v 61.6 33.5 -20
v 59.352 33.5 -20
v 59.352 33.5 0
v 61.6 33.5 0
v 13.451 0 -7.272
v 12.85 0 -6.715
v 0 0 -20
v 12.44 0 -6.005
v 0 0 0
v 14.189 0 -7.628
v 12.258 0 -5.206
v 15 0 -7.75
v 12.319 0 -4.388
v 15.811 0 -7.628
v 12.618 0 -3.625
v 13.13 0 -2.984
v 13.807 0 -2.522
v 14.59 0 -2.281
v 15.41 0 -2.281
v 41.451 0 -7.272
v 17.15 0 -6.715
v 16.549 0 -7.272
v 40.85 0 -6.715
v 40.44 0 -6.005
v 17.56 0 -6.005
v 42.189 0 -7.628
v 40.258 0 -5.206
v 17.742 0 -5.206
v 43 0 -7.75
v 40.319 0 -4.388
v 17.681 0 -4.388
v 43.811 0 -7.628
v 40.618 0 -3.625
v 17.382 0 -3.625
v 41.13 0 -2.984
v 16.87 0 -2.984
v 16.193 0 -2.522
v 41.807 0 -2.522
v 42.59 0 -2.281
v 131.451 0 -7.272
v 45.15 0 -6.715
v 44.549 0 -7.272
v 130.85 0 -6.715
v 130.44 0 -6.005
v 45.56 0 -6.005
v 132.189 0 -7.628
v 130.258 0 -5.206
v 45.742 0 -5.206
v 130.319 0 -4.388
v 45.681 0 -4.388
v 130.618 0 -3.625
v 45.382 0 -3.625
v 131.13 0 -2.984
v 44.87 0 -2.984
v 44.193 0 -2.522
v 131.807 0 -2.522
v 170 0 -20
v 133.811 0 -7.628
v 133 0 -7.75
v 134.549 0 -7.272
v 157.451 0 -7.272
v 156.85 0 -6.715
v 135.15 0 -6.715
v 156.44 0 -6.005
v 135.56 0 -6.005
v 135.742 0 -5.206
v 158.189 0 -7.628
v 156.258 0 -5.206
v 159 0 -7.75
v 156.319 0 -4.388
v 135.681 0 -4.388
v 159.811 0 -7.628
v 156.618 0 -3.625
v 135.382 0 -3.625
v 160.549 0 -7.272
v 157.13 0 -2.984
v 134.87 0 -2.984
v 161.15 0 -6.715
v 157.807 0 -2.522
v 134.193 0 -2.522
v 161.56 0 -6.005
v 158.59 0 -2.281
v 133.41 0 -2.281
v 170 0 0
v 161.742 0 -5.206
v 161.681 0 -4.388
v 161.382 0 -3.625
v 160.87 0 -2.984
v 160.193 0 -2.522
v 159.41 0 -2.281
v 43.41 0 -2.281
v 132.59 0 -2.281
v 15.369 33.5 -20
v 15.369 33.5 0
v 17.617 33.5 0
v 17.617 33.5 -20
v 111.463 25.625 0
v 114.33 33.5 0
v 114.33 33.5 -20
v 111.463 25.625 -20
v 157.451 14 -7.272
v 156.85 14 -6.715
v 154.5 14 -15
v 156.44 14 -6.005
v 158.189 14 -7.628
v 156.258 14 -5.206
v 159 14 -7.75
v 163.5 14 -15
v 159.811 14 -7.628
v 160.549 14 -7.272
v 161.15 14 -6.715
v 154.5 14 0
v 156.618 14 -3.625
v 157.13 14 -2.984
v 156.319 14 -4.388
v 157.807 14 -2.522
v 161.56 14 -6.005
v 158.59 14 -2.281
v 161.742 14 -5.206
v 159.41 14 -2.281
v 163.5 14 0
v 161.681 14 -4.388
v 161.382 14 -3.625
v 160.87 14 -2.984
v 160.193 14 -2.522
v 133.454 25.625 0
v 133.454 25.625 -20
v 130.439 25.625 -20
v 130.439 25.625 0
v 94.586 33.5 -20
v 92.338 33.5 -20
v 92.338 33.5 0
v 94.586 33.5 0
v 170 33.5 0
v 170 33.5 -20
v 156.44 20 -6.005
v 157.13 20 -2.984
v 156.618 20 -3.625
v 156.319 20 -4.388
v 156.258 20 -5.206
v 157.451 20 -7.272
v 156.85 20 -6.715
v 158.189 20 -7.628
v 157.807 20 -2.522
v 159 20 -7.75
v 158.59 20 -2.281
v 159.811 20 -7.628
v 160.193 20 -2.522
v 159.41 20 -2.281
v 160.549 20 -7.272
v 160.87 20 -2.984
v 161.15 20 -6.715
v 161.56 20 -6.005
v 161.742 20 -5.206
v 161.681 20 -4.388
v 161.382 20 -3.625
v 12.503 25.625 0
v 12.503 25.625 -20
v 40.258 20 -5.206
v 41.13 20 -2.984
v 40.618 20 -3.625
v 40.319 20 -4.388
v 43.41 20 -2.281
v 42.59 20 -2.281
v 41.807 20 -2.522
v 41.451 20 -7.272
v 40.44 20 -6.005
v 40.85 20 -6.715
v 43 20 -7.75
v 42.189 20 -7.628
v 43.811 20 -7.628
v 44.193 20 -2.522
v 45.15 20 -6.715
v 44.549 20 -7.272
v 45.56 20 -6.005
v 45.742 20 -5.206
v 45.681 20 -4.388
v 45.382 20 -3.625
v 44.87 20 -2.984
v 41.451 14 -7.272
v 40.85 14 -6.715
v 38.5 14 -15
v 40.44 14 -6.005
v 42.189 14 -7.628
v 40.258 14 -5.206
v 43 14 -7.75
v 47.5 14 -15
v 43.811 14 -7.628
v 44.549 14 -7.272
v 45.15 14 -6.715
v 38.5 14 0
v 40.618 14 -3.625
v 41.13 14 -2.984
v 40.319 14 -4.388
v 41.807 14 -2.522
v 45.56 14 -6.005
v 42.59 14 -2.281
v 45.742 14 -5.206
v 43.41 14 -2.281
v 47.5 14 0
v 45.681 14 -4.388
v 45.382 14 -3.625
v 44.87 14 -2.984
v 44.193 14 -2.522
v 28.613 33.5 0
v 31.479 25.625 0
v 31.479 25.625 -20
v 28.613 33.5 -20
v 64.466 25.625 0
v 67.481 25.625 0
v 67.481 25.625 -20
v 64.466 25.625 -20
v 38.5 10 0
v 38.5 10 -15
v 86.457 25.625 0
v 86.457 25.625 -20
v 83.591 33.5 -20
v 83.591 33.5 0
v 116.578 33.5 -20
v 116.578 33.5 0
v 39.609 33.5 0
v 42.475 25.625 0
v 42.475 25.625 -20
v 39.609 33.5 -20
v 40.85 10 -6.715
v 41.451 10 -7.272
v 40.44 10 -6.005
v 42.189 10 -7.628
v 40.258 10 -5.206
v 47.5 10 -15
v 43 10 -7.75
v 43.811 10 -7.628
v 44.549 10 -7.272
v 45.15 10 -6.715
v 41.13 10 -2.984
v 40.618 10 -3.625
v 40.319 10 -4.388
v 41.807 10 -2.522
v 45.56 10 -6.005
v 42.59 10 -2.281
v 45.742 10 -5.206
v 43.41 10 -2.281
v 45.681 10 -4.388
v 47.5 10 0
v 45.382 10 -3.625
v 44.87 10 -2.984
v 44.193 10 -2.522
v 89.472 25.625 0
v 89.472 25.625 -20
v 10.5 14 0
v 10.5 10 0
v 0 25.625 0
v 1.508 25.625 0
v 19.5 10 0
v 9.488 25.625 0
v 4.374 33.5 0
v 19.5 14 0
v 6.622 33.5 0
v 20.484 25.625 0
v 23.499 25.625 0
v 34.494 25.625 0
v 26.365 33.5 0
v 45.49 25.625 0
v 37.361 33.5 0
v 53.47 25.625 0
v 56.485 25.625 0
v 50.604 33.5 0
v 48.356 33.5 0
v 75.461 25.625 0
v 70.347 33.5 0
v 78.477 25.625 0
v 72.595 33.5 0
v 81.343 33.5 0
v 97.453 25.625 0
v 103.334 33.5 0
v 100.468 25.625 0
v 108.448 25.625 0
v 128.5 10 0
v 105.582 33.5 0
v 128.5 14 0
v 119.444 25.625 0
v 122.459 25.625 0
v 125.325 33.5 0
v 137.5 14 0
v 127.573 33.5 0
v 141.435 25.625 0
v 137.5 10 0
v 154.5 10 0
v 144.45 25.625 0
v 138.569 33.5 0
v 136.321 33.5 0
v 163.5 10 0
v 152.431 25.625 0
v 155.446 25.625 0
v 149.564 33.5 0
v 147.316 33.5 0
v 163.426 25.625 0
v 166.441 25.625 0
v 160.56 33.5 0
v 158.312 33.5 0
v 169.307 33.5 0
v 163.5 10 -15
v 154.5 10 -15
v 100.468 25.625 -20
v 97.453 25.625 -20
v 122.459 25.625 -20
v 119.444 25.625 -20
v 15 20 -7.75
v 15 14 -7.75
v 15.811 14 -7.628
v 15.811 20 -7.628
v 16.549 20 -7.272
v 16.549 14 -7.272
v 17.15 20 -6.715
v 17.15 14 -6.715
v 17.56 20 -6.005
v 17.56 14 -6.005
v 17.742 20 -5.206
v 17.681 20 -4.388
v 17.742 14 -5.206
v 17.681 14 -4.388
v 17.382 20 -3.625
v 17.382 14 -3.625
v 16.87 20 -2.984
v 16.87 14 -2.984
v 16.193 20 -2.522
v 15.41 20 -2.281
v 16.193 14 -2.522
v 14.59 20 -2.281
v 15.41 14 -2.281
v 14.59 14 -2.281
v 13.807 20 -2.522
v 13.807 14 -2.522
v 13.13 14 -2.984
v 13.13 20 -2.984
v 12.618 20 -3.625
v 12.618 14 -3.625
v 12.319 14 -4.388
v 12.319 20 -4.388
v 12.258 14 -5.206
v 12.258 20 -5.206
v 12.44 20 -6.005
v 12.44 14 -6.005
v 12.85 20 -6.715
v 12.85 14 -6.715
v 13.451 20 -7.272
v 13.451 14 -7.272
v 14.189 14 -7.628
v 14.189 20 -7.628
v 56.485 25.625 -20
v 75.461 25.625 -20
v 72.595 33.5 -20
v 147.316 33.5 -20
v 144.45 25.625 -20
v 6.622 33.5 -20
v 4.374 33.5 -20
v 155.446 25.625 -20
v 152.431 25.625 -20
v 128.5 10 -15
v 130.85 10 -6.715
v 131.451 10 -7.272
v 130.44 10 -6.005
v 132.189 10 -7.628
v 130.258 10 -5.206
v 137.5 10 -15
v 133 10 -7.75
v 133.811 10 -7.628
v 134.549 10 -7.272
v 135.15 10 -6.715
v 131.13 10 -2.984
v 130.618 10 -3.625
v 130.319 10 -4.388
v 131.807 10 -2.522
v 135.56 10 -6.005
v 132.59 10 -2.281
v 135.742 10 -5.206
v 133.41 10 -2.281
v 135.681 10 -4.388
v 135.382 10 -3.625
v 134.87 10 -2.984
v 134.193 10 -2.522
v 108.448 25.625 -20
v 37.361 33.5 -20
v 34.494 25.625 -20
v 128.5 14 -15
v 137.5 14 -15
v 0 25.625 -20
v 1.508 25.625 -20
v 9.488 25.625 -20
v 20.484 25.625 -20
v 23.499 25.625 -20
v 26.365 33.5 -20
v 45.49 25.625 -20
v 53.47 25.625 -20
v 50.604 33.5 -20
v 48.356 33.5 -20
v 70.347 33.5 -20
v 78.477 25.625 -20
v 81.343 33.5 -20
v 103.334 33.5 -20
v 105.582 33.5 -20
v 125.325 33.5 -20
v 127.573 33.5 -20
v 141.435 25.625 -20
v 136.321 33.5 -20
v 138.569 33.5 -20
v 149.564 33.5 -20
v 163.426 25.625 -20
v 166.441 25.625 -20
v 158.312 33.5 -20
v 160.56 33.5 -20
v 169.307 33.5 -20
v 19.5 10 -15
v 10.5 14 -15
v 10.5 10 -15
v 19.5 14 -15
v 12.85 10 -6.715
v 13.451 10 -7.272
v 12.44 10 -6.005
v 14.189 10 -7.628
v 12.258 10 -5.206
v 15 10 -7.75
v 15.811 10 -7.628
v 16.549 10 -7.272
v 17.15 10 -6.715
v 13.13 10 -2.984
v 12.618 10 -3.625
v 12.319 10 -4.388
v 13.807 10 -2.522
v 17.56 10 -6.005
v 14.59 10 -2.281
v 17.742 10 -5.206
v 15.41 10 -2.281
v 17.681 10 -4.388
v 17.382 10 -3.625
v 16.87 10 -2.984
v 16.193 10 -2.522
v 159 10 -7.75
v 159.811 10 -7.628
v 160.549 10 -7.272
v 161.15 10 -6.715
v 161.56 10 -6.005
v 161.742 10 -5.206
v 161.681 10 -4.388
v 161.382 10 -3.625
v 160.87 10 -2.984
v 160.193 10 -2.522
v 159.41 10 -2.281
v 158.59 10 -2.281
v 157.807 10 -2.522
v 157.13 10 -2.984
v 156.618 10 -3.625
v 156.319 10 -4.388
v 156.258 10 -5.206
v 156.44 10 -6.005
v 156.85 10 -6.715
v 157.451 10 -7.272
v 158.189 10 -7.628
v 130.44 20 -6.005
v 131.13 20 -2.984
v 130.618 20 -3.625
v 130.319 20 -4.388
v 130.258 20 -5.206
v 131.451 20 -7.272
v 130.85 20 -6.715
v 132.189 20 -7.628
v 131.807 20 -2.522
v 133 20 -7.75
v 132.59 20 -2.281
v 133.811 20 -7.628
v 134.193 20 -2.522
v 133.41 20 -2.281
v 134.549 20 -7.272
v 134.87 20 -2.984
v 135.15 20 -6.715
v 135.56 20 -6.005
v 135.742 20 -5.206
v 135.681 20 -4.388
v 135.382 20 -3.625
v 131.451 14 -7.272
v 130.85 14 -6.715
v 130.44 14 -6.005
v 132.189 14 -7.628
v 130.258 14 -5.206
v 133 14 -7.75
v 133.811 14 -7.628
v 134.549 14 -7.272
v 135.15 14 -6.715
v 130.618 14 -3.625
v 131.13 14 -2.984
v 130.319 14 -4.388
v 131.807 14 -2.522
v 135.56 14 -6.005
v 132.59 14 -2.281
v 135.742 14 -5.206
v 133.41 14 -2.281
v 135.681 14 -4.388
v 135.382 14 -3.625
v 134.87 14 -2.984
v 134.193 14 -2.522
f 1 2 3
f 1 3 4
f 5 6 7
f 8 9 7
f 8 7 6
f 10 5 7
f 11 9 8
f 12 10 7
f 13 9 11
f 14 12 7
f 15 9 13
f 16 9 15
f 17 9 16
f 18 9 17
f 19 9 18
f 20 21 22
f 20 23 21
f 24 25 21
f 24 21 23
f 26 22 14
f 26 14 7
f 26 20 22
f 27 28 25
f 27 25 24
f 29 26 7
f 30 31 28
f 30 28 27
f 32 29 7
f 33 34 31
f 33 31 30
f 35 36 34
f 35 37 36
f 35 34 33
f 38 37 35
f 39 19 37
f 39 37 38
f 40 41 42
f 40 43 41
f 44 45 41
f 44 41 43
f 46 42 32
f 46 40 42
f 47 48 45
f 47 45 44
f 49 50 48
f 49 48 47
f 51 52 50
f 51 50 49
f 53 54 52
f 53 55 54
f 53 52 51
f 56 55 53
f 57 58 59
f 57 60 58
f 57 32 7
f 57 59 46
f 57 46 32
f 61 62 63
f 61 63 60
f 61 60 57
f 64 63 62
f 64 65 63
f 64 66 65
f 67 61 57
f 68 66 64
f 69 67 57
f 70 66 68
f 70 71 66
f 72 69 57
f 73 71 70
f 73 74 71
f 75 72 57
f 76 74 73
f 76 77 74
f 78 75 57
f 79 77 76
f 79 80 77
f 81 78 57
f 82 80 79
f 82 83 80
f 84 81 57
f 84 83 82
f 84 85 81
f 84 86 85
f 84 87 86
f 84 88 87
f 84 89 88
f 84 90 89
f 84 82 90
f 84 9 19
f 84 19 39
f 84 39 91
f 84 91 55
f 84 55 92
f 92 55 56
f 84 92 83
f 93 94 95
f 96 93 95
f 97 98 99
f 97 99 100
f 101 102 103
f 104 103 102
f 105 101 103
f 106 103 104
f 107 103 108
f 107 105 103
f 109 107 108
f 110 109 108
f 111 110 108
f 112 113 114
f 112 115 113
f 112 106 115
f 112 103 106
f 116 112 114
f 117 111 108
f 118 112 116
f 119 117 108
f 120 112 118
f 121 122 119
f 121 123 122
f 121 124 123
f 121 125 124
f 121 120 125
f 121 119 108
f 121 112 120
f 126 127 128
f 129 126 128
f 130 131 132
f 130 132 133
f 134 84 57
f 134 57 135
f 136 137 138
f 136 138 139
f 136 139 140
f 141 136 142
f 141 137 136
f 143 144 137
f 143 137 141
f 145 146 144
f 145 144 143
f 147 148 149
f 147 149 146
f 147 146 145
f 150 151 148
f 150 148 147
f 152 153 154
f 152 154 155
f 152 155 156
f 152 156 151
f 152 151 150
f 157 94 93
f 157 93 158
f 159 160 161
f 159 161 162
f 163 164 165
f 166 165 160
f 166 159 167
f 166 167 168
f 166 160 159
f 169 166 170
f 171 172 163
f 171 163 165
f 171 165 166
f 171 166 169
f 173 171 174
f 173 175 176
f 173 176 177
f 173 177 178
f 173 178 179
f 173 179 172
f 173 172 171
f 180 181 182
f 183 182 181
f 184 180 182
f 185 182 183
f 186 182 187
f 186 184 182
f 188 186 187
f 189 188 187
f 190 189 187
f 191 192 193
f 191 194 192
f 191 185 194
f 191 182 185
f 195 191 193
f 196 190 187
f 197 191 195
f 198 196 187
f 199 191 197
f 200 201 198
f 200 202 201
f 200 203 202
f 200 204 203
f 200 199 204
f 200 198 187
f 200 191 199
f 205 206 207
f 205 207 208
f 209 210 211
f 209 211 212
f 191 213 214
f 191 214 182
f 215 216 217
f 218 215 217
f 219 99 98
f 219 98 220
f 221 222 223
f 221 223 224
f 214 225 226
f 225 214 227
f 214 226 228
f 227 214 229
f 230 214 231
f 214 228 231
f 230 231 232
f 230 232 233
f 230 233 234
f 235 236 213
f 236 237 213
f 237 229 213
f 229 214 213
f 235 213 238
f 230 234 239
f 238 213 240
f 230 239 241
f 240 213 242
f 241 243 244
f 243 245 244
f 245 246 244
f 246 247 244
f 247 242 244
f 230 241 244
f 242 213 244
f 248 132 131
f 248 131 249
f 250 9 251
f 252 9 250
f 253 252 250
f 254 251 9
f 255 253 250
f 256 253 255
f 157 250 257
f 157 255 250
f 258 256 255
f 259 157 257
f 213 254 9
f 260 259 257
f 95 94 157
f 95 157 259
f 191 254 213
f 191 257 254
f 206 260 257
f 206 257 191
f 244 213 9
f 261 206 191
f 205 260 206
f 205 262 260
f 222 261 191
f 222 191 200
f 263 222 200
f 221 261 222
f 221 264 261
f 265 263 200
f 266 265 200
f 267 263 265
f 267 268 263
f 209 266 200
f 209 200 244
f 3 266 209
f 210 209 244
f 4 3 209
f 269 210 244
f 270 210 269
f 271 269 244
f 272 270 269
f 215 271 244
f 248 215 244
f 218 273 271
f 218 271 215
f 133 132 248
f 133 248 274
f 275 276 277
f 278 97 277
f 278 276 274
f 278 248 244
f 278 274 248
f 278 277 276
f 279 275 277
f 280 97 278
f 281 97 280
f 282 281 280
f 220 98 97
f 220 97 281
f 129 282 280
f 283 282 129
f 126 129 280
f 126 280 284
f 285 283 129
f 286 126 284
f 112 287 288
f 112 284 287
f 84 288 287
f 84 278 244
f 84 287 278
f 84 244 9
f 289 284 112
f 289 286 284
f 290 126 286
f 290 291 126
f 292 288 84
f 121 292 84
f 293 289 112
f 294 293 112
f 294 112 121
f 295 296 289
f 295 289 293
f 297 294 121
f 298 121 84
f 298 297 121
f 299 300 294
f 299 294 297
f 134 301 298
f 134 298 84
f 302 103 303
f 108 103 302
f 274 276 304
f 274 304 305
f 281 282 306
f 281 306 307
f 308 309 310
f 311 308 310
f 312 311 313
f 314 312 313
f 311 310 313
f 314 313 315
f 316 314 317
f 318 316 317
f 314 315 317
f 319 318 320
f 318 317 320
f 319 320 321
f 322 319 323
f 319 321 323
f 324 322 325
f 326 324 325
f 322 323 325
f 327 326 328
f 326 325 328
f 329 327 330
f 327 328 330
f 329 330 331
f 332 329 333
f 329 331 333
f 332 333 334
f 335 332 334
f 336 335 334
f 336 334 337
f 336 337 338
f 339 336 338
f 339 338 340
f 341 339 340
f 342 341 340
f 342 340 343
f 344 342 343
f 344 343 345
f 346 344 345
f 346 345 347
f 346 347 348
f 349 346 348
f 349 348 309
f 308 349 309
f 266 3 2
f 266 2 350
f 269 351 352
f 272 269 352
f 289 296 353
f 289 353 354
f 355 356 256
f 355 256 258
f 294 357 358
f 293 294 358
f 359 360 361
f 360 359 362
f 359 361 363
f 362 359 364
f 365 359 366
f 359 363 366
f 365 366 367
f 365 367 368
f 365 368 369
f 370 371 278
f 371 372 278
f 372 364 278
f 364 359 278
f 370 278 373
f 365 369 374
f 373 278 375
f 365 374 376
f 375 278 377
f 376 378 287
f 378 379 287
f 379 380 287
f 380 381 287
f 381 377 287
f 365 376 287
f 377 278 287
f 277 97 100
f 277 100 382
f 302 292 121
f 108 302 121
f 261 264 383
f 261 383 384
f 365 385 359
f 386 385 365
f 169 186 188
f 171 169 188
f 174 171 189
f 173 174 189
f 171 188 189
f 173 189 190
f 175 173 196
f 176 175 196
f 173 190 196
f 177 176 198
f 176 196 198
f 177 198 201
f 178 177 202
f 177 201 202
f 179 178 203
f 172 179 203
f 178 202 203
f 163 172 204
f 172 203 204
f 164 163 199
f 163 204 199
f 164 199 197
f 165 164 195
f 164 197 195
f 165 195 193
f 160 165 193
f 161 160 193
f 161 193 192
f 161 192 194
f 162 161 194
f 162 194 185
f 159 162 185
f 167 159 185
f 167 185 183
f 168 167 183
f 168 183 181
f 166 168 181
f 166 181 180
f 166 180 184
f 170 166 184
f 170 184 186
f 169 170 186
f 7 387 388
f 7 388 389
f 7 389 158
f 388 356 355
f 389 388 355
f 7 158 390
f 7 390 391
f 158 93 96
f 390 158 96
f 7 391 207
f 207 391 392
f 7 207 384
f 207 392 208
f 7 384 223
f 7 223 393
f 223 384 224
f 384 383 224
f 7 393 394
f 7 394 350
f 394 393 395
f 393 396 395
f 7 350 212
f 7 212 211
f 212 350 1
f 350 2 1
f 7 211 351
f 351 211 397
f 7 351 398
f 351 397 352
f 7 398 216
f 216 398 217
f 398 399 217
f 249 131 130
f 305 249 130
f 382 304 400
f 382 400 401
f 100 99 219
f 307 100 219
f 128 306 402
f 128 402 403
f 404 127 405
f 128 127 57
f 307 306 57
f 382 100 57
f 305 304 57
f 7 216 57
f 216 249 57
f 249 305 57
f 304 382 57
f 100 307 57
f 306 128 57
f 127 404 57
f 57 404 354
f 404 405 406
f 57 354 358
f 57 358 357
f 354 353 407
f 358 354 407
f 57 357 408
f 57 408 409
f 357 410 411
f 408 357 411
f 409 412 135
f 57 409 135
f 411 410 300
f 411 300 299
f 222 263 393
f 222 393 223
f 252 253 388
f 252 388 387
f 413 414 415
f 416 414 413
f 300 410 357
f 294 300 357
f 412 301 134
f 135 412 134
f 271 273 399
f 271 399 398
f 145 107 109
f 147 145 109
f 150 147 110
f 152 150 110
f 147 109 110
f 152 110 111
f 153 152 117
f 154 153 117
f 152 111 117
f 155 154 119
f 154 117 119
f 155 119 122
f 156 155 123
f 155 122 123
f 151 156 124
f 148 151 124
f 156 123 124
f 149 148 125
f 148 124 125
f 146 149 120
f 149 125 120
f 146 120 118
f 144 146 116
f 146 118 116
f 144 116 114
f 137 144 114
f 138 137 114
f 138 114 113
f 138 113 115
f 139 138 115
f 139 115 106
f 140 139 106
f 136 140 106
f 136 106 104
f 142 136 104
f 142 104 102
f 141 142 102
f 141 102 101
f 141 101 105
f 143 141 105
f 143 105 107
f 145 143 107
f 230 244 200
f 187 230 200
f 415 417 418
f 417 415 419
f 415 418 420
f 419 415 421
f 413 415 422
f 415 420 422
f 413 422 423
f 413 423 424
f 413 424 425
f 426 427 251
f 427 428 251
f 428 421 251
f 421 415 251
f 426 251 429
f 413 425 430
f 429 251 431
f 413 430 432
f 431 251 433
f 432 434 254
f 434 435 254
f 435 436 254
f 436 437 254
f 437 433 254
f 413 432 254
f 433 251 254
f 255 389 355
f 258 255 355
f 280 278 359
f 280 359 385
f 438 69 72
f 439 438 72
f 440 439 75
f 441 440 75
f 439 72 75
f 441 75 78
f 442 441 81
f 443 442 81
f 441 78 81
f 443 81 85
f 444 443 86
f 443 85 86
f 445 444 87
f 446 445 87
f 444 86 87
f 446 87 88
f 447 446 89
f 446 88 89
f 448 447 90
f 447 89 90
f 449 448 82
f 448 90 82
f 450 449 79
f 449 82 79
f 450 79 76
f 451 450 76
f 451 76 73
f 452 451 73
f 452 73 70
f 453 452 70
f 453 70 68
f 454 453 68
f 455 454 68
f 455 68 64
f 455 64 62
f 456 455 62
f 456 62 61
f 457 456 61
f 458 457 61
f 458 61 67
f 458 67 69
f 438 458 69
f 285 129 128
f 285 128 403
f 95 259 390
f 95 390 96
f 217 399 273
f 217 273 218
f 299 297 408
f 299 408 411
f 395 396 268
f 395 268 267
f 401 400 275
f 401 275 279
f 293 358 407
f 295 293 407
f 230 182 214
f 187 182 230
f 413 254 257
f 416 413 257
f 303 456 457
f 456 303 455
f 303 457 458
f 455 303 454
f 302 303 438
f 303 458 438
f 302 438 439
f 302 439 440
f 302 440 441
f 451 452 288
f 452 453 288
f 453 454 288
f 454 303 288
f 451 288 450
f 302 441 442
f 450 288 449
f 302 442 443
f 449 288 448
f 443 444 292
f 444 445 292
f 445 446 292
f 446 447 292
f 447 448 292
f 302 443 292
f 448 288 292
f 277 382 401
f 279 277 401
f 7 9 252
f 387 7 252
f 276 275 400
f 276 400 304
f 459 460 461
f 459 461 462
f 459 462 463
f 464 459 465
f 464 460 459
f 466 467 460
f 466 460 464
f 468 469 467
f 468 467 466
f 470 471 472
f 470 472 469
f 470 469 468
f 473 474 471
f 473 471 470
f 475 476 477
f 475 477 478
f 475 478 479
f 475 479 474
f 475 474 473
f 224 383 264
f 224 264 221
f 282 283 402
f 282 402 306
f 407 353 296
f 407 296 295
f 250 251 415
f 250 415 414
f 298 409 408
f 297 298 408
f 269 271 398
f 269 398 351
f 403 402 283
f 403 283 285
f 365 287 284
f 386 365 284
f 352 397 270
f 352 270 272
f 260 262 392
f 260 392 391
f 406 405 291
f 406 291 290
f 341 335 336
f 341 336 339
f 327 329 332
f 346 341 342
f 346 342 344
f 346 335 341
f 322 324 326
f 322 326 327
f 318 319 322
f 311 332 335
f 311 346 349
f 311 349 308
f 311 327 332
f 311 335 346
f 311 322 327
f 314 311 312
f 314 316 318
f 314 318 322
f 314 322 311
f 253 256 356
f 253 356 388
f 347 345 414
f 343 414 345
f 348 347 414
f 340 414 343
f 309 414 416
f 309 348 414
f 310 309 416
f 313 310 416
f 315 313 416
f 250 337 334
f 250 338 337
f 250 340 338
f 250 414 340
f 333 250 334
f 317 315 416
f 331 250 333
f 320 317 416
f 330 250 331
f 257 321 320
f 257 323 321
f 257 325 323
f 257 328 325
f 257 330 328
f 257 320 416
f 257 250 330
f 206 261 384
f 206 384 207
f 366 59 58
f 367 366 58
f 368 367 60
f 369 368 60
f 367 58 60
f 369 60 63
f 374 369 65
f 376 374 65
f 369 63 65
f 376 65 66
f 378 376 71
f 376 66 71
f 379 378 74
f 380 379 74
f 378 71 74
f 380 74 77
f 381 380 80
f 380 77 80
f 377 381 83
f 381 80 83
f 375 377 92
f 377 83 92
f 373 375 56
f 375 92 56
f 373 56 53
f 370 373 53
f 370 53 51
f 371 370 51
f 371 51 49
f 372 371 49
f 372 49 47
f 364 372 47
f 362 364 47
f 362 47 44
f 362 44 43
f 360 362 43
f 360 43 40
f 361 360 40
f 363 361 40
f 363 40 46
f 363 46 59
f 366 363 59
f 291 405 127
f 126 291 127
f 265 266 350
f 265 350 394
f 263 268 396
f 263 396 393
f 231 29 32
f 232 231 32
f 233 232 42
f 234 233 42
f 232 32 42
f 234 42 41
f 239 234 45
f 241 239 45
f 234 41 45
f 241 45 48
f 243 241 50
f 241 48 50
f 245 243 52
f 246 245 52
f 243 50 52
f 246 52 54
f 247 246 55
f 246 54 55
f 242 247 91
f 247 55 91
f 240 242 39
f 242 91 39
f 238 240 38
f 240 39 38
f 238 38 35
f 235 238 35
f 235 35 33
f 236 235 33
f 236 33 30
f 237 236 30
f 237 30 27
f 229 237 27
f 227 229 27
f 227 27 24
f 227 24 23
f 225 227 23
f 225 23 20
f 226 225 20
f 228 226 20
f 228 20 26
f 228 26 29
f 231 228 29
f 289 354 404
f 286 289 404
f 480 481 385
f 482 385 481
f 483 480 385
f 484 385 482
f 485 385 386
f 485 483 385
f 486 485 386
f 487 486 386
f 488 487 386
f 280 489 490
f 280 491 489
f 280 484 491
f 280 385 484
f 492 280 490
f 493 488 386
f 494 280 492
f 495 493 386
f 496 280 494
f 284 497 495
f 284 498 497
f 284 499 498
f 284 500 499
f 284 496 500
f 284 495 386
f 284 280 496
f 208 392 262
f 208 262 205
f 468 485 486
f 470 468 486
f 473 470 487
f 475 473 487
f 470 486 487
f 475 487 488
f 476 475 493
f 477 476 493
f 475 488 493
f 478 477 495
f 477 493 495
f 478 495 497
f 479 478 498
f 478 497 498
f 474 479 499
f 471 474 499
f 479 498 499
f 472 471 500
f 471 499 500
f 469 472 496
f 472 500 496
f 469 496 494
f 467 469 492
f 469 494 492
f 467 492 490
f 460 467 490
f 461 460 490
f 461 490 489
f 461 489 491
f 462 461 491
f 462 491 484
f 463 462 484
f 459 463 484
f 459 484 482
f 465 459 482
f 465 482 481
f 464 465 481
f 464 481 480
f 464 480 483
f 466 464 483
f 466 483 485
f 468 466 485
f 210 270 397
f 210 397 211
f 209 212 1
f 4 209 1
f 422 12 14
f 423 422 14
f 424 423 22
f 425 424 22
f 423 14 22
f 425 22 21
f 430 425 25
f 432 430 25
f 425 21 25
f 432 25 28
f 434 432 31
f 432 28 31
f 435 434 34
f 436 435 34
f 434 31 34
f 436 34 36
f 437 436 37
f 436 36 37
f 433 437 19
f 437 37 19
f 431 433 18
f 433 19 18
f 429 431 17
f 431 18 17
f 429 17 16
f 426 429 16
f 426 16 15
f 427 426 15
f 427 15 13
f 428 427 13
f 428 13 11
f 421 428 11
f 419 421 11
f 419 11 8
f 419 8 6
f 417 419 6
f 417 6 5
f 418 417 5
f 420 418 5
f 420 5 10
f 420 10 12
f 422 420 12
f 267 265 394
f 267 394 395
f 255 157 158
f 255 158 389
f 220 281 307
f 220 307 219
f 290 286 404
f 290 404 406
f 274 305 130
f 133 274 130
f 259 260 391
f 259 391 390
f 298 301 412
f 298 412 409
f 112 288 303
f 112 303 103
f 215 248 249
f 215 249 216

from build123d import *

# Parameters (mm, degrees)
BLANKSKE_W         = 170
BLANKSKE_H         = 33.5
BLANK_DEPTH        = 20
TOOTHCUTSIM_DEPTH  = 175.419752322
TEETHCUTS_COUNT    = 16
TEETHCUTS_PITCH    = 10.995574275
SKETCH2_W          = 9
SKETCH2_H          = 4
CUT_EXTRUDE1_DEPTH = 15
SKETCH4_R          = 2.75
CUT_EXTRUDE2_DEPTH = 20


with BuildPart() as part:
    # BlankSke → Blank (new body)
    with BuildSketch(Plane.XY):
        with Locations((85, 16.75)):
            Rectangle(BLANKSKE_W, BLANKSKE_H)
    extrude(amount=-BLANK_DEPTH)

    # TooCutSkeSim → ToothCutSim (cut, through all)
    with BuildSketch(Plane.XY):
        Polygon((1.507523794, 25.625), (-1.507523794, 25.625), (-4.383034233, 33.5254), (4.383034233, 33.5254), align=None)
    toothcutsim = extrude(amount=-TOOTHCUTSIM_DEPTH, mode=Mode.SUBTRACT)

    # TeethCuts: ToothCutSim ×16
    with Locations(*[(i * TEETHCUTS_PITCH, 0, 0) for i in range(1, TEETHCUTS_COUNT)]):
        add(toothcutsim, mode=Mode.SUBTRACT)

    # Sketch2 → Cut-Extrude1 (cut)
    with BuildSketch(Plane.XY):
        with Locations((15, 12)):
            Rectangle(SKETCH2_W, SKETCH2_H)
        with Locations((43, 12)):
            Rectangle(SKETCH2_W, SKETCH2_H)
        with Locations((133, 12)):
            Rectangle(SKETCH2_W, SKETCH2_H)
        with Locations((159, 12)):
            Rectangle(SKETCH2_W, SKETCH2_H)
    extrude(amount=-CUT_EXTRUDE1_DEPTH, mode=Mode.SUBTRACT)

    # Sketch4 → Cut-Extrude2 (cut)
    with BuildSketch(Plane.XZ):
        with Locations(Location((15, -5, 0), (0, 0, 270))):
            Circle(SKETCH4_R)
        with Locations(Location((43, -5, 0), (0, 0, 270))):
            Circle(SKETCH4_R)
        with Locations(Location((133, -5, 0), (0, 0, 270))):
            Circle(SKETCH4_R)
        with Locations(Location((159, -5, 0), (0, 0, 270))):
            Circle(SKETCH4_R)
    extrude(amount=-CUT_EXTRUDE2_DEPTH, mode=Mode.SUBTRACT)


solid = part.part
